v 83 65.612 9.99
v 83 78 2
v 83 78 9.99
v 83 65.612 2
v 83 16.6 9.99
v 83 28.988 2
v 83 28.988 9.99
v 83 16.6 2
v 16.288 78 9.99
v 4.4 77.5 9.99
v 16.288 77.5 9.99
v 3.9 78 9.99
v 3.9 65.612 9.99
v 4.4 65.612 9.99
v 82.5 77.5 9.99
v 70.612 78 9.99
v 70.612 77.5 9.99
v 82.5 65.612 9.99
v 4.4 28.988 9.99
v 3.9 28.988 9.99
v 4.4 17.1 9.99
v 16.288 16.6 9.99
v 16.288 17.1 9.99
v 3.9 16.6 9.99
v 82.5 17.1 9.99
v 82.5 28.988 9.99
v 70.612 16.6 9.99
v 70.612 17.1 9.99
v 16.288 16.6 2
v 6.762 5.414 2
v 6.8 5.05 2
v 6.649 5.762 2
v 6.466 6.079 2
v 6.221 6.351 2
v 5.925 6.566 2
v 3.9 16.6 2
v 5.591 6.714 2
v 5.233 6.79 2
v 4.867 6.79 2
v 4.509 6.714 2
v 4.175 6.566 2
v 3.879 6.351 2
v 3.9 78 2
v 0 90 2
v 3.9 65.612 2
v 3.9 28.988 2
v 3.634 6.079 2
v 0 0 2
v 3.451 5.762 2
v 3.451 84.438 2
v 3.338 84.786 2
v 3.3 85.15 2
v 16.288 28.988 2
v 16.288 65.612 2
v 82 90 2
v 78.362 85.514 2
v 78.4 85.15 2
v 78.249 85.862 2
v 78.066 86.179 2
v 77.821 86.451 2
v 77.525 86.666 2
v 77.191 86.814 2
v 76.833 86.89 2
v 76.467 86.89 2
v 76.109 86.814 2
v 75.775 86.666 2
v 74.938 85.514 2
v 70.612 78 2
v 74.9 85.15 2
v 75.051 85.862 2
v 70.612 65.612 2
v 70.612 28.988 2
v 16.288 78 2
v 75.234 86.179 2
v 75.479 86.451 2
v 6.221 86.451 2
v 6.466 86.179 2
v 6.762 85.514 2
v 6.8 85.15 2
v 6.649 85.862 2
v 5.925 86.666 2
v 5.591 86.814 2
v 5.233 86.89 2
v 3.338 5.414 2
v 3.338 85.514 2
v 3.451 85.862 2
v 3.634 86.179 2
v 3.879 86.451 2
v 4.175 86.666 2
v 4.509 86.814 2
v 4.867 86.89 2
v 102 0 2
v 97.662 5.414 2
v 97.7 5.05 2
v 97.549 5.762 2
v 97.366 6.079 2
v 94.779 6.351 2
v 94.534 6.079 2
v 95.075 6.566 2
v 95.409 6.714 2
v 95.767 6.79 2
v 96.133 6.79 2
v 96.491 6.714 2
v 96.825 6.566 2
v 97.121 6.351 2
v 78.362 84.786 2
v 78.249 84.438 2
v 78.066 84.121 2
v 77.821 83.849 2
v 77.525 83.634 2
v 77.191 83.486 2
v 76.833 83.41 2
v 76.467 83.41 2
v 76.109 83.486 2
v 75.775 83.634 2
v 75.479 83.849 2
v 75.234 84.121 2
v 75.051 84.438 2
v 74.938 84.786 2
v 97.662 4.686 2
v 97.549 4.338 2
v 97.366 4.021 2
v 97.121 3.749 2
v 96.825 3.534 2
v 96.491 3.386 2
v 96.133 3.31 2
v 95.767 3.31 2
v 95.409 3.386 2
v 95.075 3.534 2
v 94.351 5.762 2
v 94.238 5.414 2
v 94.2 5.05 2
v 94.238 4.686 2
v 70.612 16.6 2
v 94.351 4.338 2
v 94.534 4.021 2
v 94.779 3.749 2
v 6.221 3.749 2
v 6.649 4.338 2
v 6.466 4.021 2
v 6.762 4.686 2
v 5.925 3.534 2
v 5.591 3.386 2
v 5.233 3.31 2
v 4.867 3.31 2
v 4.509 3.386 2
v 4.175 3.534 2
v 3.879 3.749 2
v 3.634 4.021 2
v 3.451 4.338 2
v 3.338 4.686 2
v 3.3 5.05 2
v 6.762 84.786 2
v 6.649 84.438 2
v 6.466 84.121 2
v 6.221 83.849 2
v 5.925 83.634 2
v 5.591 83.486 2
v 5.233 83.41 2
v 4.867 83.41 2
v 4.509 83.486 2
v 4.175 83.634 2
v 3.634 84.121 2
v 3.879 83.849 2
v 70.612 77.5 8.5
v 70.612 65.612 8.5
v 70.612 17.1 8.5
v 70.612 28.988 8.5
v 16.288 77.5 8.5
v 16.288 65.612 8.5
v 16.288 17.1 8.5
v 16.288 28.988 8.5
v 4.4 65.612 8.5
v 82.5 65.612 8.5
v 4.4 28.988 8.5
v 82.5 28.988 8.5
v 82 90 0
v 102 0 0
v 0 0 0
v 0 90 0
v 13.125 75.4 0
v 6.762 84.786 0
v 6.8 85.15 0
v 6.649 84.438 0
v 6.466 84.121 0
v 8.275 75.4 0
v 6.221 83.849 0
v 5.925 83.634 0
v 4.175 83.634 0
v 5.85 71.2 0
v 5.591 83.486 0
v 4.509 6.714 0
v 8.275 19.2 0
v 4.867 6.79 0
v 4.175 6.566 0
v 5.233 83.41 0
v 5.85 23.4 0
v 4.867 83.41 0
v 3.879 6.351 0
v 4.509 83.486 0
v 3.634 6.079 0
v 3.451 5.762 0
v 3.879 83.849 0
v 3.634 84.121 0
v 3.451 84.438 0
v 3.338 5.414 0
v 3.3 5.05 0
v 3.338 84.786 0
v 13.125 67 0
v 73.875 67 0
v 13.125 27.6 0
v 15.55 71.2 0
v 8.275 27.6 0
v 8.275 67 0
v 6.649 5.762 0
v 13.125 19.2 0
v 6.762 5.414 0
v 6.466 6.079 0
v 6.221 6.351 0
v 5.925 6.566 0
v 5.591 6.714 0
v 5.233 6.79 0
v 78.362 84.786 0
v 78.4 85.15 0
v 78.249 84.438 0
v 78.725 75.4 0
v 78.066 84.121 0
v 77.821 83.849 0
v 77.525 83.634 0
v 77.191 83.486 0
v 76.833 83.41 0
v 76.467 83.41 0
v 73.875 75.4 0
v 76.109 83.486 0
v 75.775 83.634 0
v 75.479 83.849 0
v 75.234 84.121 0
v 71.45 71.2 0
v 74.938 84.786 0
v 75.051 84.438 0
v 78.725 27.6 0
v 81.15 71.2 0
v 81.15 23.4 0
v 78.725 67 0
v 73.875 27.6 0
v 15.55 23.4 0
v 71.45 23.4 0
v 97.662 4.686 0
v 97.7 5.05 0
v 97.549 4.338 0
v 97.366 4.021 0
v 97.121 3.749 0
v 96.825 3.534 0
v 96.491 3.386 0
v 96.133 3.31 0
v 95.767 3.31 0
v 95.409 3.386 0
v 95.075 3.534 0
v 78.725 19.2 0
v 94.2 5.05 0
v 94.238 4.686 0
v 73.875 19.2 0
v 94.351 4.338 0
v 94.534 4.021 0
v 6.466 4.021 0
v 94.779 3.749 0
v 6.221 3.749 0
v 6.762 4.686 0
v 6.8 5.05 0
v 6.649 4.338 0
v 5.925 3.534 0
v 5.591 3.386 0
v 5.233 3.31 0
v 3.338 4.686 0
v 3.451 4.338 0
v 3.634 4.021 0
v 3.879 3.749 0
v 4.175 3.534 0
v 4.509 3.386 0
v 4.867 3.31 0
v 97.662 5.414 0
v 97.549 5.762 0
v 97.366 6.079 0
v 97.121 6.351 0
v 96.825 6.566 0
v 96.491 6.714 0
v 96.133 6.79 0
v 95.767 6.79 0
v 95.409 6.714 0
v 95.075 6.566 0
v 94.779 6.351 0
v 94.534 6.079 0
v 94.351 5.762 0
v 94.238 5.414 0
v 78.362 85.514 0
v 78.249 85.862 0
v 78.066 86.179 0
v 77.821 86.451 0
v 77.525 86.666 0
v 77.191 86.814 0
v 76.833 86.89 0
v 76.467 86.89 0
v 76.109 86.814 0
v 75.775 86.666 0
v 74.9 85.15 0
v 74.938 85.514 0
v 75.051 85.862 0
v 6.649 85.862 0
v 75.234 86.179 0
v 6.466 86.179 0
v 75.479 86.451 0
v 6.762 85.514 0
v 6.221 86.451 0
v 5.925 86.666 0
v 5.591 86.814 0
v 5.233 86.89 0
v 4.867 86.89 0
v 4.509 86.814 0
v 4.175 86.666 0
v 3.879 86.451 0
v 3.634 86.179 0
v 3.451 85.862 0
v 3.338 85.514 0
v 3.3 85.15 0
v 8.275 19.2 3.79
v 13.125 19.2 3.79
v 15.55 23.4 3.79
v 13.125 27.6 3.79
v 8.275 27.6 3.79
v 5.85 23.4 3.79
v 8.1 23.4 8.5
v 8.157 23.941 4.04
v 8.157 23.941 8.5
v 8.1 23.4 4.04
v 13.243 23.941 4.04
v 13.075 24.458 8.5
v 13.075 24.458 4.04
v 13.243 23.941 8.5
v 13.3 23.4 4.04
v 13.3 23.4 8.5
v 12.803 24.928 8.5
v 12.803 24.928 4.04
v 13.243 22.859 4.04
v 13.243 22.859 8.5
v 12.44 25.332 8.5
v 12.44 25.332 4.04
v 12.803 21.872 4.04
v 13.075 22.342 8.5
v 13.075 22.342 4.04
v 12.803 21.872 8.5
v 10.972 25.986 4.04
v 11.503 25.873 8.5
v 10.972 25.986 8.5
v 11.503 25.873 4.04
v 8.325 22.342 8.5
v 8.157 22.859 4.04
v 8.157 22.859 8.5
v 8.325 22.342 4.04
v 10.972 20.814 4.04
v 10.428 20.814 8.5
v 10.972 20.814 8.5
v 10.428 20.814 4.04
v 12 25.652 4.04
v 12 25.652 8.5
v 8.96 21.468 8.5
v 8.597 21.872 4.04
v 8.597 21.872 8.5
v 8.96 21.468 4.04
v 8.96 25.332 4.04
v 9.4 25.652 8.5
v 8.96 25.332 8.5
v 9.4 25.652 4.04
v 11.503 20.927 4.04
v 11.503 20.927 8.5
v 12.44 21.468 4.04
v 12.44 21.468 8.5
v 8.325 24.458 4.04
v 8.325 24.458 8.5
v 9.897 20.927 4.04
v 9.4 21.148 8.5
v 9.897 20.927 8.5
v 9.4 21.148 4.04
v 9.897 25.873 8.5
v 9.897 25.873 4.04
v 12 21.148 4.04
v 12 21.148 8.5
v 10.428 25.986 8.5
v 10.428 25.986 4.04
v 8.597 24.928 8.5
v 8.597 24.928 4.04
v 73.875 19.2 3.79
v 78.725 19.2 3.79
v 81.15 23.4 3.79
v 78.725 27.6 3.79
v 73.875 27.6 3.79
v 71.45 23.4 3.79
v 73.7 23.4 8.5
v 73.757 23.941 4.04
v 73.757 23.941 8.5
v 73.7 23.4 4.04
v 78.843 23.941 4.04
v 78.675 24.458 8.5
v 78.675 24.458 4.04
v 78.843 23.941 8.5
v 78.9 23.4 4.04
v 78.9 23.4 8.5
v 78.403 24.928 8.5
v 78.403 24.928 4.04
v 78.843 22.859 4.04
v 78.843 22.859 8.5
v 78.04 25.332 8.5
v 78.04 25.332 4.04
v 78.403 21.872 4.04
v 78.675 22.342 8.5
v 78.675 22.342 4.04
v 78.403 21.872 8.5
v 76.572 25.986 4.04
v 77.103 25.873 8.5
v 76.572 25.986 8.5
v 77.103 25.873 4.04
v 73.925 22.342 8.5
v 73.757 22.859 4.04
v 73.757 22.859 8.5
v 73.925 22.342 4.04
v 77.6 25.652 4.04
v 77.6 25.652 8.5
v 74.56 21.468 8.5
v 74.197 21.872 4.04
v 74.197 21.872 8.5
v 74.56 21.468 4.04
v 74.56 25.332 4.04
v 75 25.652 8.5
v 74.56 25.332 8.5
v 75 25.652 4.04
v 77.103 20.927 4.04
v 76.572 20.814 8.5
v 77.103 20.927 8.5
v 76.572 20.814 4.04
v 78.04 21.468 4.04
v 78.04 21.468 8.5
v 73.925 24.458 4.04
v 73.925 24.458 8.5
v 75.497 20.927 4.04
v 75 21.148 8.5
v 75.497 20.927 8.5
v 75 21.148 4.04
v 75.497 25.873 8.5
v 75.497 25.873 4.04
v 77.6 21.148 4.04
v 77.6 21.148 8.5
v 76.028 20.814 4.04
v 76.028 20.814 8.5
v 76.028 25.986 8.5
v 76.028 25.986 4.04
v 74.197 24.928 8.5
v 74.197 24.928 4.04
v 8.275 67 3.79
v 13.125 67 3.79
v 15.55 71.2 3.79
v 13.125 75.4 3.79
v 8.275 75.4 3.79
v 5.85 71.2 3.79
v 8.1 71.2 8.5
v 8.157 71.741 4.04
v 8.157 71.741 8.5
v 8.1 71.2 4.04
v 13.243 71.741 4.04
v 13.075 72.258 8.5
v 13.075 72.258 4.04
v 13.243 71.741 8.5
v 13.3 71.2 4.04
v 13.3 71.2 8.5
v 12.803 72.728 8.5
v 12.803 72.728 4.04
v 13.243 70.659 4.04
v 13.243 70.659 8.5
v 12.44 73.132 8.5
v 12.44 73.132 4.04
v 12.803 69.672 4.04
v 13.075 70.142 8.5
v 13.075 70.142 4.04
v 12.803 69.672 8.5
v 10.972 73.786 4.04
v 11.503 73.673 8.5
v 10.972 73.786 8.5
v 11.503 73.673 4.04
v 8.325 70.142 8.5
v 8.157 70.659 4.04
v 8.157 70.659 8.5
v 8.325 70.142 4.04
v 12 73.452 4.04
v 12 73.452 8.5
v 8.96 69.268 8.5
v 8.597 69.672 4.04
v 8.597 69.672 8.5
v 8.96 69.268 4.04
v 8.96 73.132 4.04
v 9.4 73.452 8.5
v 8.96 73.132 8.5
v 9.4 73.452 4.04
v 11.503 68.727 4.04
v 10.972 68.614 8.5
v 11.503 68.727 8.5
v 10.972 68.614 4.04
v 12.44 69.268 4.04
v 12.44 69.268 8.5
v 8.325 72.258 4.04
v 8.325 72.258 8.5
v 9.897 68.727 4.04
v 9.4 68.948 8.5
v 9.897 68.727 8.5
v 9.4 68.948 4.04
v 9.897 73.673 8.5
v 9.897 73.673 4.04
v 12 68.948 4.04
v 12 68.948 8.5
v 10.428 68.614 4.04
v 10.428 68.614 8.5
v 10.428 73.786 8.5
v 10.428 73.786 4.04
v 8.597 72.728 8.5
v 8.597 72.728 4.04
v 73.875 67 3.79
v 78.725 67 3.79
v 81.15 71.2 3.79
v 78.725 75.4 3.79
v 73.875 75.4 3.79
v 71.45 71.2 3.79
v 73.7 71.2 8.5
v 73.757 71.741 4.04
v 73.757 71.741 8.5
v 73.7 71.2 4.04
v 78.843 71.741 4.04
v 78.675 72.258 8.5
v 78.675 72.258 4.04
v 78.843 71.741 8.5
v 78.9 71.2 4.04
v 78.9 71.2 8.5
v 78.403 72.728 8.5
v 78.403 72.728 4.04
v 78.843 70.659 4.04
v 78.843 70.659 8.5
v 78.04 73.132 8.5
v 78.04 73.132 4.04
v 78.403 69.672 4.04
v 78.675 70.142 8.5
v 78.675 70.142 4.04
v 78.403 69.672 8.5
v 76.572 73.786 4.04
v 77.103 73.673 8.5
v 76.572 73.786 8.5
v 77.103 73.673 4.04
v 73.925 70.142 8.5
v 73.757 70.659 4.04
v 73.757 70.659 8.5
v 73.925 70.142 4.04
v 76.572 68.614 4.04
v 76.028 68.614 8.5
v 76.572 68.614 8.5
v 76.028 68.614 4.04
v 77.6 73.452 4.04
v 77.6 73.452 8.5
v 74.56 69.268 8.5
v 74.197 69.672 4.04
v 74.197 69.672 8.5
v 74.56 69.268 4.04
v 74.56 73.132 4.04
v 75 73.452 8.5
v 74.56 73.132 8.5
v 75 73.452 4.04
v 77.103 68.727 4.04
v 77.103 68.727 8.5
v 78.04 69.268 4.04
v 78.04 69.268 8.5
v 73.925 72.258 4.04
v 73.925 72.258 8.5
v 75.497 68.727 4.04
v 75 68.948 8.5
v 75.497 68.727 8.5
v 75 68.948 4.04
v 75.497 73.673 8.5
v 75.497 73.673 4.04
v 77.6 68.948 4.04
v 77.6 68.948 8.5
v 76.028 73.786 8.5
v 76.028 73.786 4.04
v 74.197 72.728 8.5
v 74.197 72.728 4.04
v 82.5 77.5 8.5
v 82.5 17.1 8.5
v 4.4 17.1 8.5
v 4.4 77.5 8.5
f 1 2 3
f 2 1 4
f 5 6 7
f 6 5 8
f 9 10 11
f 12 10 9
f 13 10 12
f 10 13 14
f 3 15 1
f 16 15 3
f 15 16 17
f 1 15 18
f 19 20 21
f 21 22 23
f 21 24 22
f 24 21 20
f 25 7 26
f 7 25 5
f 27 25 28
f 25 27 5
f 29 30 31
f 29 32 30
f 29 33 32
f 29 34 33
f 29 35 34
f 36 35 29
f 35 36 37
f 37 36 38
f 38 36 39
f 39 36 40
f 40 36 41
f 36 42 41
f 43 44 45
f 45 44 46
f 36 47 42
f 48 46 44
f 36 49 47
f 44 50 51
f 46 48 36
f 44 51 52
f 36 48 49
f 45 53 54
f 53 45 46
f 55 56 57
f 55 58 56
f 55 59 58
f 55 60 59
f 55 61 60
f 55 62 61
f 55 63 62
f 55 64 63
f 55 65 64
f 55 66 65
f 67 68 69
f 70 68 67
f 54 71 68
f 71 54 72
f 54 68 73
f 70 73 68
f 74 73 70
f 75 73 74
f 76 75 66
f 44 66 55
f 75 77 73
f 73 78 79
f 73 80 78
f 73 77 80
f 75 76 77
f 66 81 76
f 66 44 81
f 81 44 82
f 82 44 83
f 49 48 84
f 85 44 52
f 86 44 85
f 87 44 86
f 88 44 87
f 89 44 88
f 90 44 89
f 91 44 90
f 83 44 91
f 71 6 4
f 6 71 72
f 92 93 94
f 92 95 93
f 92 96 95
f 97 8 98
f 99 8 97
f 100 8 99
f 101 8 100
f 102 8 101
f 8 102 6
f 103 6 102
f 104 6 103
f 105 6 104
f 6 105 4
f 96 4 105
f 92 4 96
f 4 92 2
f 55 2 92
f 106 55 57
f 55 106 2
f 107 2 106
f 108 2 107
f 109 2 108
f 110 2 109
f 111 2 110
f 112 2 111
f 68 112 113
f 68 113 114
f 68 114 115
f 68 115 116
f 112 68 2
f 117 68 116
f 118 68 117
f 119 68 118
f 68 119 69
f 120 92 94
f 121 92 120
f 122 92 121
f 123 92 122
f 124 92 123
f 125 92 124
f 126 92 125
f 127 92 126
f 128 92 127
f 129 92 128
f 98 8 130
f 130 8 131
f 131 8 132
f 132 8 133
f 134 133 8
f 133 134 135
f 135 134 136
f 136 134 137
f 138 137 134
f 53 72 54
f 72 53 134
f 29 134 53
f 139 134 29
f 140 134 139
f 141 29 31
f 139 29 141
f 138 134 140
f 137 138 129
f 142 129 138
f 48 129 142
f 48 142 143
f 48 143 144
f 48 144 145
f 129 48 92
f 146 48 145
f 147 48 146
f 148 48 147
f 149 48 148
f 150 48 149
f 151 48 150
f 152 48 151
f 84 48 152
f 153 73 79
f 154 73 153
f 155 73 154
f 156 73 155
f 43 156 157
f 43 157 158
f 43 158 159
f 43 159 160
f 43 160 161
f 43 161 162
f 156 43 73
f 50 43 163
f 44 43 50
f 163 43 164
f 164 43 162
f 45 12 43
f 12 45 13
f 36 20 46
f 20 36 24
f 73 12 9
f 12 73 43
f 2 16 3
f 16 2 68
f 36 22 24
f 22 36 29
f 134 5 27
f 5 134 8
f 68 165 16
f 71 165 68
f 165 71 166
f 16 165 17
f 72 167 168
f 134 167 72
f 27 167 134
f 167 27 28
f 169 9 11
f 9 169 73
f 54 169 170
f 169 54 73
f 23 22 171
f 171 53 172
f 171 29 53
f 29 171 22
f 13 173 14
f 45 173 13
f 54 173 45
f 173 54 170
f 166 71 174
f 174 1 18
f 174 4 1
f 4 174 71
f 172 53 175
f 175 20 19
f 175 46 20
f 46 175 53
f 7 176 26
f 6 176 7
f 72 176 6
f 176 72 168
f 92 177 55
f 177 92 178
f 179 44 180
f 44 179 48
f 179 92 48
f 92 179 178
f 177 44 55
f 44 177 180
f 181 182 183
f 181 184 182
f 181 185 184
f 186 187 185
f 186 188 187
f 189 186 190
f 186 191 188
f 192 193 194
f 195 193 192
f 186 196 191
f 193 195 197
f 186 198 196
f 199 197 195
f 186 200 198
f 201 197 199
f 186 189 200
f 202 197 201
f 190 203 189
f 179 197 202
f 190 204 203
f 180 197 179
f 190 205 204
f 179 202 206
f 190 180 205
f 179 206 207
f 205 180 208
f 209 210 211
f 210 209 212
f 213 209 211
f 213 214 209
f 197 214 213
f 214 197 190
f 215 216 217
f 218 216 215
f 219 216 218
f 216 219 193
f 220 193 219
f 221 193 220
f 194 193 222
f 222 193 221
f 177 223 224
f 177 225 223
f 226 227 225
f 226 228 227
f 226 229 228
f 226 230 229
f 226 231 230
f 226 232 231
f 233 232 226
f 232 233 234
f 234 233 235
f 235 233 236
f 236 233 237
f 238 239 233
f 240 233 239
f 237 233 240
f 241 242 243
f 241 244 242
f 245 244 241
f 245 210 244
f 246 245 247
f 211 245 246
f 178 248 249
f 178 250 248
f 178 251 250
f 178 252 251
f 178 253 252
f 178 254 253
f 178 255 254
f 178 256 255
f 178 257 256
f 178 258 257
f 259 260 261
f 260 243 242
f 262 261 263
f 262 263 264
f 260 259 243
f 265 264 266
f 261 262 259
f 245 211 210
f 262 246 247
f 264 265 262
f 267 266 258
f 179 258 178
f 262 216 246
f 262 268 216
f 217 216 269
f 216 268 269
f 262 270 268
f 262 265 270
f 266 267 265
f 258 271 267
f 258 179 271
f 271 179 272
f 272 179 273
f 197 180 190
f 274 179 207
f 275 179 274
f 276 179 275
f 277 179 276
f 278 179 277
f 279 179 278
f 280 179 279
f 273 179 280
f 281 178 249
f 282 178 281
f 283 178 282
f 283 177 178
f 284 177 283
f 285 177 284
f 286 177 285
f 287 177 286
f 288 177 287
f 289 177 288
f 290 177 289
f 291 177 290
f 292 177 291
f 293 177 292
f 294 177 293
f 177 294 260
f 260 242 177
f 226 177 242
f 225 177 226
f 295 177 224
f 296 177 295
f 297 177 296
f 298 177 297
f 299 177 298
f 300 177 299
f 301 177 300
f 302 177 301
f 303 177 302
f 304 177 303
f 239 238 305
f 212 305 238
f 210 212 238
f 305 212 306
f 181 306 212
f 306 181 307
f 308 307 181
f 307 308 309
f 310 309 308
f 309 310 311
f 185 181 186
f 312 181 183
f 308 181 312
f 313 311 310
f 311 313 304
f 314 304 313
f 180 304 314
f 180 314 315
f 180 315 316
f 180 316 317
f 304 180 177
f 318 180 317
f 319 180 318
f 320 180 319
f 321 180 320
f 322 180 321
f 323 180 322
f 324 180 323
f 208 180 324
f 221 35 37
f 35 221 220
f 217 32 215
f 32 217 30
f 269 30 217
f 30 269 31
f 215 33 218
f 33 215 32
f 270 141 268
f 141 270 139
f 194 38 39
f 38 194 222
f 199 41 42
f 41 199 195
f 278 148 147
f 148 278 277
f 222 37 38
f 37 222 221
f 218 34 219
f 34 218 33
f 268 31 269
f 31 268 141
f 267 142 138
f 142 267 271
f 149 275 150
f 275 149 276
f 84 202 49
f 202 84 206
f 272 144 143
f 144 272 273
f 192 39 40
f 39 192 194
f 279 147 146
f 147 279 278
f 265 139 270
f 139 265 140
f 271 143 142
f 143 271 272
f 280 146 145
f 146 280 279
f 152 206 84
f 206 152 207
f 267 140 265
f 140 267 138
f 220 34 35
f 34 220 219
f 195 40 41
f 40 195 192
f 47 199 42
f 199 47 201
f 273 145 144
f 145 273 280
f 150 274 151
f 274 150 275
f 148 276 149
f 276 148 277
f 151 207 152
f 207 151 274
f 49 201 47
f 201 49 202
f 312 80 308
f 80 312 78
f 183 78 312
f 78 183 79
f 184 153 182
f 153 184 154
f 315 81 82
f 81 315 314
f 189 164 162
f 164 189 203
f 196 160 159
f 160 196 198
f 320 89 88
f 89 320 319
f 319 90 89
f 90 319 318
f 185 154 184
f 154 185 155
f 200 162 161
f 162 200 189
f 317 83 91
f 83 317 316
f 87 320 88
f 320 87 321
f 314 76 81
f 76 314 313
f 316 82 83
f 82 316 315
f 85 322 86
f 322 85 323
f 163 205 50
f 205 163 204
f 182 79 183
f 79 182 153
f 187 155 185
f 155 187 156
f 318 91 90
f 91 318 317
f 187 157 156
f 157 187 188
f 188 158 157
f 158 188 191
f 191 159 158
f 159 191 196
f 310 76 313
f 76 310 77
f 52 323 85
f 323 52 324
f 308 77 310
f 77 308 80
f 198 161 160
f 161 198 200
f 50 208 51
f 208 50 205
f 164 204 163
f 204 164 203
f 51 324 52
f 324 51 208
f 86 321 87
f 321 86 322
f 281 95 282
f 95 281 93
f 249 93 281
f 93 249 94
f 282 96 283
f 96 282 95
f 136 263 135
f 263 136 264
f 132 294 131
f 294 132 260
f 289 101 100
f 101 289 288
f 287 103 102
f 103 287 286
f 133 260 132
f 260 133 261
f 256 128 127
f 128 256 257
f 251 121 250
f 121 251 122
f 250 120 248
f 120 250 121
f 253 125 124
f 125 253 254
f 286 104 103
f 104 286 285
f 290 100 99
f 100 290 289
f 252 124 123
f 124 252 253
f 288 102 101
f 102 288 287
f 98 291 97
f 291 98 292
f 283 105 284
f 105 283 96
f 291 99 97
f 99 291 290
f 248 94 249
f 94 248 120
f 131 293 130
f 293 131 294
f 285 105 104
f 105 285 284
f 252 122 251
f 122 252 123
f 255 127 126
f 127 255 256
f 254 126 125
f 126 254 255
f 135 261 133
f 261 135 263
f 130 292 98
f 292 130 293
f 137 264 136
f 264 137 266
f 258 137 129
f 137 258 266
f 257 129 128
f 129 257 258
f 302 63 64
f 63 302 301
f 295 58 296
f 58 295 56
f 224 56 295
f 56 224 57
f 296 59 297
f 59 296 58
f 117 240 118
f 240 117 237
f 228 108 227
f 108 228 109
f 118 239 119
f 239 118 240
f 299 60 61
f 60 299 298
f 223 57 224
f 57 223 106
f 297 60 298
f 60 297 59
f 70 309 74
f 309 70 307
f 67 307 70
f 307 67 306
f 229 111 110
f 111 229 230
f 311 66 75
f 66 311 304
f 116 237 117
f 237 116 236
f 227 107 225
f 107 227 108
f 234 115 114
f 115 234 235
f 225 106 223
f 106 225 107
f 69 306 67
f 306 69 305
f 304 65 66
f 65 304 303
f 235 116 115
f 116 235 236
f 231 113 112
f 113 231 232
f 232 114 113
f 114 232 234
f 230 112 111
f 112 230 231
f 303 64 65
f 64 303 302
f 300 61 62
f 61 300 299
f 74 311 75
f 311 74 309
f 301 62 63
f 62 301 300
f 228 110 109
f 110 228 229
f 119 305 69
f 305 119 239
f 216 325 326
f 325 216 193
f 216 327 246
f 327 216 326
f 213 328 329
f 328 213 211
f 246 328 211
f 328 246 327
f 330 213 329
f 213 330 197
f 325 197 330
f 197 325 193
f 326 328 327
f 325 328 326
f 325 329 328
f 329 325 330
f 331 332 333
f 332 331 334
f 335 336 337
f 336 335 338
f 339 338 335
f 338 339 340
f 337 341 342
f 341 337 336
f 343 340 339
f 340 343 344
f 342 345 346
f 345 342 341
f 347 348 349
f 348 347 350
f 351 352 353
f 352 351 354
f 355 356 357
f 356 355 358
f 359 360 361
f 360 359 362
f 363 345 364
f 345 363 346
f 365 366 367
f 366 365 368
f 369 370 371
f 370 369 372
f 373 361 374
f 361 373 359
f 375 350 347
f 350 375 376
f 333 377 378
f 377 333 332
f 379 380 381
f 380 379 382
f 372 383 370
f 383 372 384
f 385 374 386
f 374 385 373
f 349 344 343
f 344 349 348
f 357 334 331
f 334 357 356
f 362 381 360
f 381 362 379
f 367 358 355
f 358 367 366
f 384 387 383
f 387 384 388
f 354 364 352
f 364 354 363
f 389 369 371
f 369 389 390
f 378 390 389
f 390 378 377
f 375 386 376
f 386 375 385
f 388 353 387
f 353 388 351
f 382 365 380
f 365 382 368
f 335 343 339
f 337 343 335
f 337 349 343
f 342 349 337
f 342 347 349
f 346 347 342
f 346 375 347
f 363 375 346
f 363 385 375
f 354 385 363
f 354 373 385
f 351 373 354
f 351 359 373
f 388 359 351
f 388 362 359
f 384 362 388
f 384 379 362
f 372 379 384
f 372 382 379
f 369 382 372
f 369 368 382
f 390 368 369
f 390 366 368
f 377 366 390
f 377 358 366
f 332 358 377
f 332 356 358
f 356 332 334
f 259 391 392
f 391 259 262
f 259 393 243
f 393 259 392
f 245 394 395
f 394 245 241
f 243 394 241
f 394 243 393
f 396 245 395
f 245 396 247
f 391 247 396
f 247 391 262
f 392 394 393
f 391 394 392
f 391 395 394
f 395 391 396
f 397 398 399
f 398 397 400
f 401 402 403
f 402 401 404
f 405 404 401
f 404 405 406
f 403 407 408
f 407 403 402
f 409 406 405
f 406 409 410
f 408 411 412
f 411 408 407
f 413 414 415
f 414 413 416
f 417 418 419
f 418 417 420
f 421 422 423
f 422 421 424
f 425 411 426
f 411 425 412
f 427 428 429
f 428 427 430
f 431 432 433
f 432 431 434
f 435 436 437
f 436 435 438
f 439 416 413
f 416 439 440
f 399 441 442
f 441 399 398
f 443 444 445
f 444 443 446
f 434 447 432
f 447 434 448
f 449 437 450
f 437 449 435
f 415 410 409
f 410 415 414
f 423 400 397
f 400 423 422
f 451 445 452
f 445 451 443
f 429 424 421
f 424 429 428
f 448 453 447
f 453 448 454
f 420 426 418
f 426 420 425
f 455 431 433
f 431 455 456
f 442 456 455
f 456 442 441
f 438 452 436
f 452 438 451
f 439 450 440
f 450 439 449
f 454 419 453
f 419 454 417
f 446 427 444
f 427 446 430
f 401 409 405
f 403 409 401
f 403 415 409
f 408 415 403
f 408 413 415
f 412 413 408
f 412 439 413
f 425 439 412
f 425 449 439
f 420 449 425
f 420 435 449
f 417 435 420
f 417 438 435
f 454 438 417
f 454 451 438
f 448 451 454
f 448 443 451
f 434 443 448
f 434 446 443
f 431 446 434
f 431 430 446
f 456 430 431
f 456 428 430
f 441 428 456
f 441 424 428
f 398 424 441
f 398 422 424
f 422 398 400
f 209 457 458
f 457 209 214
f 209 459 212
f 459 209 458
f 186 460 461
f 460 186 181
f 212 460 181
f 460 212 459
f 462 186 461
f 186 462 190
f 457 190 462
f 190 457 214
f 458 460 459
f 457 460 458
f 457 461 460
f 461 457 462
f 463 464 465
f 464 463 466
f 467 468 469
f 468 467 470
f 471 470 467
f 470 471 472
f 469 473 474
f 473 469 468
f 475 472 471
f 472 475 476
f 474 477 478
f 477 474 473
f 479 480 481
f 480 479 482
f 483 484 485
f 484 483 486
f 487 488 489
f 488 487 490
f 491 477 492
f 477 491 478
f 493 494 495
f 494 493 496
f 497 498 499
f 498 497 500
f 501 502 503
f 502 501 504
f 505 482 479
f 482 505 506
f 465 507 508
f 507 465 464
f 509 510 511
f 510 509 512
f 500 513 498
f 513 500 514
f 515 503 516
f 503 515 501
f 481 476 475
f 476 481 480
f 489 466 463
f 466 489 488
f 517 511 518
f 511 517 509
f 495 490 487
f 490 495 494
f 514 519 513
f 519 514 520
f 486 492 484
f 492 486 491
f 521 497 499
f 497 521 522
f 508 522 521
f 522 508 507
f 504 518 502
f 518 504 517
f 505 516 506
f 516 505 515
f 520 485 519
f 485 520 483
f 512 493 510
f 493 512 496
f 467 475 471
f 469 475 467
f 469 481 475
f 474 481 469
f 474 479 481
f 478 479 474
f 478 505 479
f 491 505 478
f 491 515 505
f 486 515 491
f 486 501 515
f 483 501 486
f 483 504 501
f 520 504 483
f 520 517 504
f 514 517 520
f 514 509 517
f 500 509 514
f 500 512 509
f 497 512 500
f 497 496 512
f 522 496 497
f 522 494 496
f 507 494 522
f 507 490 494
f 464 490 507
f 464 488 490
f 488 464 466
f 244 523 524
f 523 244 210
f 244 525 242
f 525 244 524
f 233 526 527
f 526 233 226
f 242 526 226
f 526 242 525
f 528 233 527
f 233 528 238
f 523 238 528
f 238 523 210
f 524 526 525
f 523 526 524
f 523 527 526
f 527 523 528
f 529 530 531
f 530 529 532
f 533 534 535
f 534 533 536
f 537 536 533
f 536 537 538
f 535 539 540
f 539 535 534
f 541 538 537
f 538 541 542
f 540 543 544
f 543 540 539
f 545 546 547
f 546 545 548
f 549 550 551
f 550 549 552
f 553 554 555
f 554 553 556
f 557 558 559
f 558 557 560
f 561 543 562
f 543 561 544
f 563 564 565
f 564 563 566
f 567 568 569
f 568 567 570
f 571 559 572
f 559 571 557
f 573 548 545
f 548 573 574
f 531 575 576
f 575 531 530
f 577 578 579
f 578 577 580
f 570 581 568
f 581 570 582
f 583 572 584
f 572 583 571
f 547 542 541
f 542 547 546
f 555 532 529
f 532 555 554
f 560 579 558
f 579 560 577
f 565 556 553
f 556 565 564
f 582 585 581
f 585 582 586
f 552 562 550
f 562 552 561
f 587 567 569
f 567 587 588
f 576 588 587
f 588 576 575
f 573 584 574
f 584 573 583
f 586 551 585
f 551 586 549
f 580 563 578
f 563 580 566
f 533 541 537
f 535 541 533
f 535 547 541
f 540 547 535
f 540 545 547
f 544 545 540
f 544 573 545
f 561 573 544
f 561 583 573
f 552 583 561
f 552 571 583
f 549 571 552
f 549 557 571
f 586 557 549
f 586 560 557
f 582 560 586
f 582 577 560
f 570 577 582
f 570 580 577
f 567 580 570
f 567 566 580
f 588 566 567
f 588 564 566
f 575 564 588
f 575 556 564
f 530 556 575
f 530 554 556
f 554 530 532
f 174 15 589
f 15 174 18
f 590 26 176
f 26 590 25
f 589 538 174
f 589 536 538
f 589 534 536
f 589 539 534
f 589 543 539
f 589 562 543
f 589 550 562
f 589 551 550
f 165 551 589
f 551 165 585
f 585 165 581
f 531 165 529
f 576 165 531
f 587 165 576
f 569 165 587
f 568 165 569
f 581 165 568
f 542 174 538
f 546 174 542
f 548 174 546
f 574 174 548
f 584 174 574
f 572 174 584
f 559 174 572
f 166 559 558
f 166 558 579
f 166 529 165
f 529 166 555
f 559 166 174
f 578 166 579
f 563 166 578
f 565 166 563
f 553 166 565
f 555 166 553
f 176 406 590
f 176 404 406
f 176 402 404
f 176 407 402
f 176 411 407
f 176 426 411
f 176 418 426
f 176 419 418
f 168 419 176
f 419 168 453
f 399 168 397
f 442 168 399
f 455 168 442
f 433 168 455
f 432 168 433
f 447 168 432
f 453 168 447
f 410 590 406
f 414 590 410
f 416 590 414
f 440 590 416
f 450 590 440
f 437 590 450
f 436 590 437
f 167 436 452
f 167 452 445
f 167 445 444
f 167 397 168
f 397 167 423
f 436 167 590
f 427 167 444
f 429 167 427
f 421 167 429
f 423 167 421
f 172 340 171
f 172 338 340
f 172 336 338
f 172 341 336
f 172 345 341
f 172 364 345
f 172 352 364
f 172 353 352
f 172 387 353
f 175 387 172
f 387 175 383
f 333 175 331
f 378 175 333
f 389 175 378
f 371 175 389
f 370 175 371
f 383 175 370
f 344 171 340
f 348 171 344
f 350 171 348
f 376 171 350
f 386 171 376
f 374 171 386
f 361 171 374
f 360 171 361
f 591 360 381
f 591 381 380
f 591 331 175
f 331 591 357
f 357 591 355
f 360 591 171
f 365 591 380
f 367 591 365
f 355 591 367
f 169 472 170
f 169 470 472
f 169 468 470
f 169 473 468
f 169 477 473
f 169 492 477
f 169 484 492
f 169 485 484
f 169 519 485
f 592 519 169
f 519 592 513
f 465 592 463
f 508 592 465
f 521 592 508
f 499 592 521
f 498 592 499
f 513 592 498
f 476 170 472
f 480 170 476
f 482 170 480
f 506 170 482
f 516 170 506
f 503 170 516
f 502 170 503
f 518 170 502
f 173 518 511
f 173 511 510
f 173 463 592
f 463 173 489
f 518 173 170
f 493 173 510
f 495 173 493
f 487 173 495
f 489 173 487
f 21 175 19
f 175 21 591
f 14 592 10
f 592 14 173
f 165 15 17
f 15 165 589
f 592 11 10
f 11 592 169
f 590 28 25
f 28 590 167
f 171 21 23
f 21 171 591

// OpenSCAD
// errata
// add cut for contact spring at the lower Y side
// pcb limiter edges should start away from pcb as printer creates blobs at the ends

$fn = 30;
layer = 0.25;
wall = 0.5;
t = 0.01;
clearance = 0.2;
mount_w = 100;
mount_l = 90;
mount_h = 2;
mount_hole_d = 3.5;
mount_holes = [
    [3.3+1.75, 3.3+1.75, 3.5],
    [3.3+1.75, 83.4+1.75, 3.5],
    [94.2+1.75, 3.3+1.75, 3.5],
    [74.9+1.75, 83.4+1.75, 3.5],
];
pcb_w = 77.7;
pcb_l = 60;
pcb_h = 1.5;
pcb_hole_d = 5.2;
pcb_x = 7.7-3.1;
pcb_y = 20.4-3.1;
pcb_holes = [
    [3.1+3, 3.1+3],
    [68.7+3, 3.1+3],
    [3.1+3, 50.9+3],
    [68.7+3, 50.9+3]
];
bolt_h = 10;
//pcb_mount_h = 3.5;
nut_h = 3.8;
nut_w = 8+clearance*2;
nut_d = 2*nut_w/sqrt(3);
// nut + shim = 4.8
// pcb holder = 2
// pcb = 1.5
// pcb bottom spacing = 3.5
// bolt h min = 11.8
pcb_mount_h = bolt_h - mount_h - pcb_h;

module pcb(positive) {
    c=clearance;
    if (positive) {
        /*for (hole = pcb_holes) {
            translate([hole.x, hole.y, 0])
            cylinder(r = 5.588, h = pcb_mount_h);
        }*/
        difference() {
            h = pcb_mount_h + pcb_h-t;
            translate([-wall-c, -wall-c, 0])
            cube([pcb_w+wall*2+c*2, pcb_l+wall*2+c*2, h]);
            corner = 3.1+3+5.588;
            //cube([pcb_w, pcb_l, pcb_mount_h + pcb_h+t]);
            translate([corner, -wall-t-c, 0])
            cube([pcb_w - corner*2, pcb_l+wall*2+t*2+c*2, h+t]);
            translate([-wall-t-c, corner, 0])
            cube([pcb_w+wall*2+t*2+c*2, pcb_l - corner*2, h+t]);
        }
    } else {
        translate([-c, -c, pcb_mount_h])
        cube([pcb_w+c*2, pcb_l+c*2, pcb_h]);
        for (hole = pcb_holes) {
            translate([hole.x, hole.y, -mount_h-t]) {
                cylinder(d = nut_d, h = nut_h, $fn=6);
                translate([0, 0, nut_h + layer])
                cylinder(d = 5.2, h = pcb_mount_h+t+nut_h);
            }
        }
    }
}

module plate() {
    difference() {
        union() {
            linear_extrude(mount_h) {
                polygon([
                    [0, 0], [mount_w+2, 0],
                    [mount_w-18, mount_l], [0, mount_l]
                ]);
            }
            //cube([mount_w, mount_l, mount_h]);
            translate([pcb_x, pcb_y, mount_h])
            pcb(true);
        }
        for (hole = mount_holes) {
            translate([hole.x, hole.y, -t])
            cylinder(d = hole[2], h = mount_h + t*2 + pcb_mount_h);
        }
        translate([pcb_x, pcb_y, mount_h])
        pcb(false);
        // pcb vent
        //translate([
    }
}

plate();
